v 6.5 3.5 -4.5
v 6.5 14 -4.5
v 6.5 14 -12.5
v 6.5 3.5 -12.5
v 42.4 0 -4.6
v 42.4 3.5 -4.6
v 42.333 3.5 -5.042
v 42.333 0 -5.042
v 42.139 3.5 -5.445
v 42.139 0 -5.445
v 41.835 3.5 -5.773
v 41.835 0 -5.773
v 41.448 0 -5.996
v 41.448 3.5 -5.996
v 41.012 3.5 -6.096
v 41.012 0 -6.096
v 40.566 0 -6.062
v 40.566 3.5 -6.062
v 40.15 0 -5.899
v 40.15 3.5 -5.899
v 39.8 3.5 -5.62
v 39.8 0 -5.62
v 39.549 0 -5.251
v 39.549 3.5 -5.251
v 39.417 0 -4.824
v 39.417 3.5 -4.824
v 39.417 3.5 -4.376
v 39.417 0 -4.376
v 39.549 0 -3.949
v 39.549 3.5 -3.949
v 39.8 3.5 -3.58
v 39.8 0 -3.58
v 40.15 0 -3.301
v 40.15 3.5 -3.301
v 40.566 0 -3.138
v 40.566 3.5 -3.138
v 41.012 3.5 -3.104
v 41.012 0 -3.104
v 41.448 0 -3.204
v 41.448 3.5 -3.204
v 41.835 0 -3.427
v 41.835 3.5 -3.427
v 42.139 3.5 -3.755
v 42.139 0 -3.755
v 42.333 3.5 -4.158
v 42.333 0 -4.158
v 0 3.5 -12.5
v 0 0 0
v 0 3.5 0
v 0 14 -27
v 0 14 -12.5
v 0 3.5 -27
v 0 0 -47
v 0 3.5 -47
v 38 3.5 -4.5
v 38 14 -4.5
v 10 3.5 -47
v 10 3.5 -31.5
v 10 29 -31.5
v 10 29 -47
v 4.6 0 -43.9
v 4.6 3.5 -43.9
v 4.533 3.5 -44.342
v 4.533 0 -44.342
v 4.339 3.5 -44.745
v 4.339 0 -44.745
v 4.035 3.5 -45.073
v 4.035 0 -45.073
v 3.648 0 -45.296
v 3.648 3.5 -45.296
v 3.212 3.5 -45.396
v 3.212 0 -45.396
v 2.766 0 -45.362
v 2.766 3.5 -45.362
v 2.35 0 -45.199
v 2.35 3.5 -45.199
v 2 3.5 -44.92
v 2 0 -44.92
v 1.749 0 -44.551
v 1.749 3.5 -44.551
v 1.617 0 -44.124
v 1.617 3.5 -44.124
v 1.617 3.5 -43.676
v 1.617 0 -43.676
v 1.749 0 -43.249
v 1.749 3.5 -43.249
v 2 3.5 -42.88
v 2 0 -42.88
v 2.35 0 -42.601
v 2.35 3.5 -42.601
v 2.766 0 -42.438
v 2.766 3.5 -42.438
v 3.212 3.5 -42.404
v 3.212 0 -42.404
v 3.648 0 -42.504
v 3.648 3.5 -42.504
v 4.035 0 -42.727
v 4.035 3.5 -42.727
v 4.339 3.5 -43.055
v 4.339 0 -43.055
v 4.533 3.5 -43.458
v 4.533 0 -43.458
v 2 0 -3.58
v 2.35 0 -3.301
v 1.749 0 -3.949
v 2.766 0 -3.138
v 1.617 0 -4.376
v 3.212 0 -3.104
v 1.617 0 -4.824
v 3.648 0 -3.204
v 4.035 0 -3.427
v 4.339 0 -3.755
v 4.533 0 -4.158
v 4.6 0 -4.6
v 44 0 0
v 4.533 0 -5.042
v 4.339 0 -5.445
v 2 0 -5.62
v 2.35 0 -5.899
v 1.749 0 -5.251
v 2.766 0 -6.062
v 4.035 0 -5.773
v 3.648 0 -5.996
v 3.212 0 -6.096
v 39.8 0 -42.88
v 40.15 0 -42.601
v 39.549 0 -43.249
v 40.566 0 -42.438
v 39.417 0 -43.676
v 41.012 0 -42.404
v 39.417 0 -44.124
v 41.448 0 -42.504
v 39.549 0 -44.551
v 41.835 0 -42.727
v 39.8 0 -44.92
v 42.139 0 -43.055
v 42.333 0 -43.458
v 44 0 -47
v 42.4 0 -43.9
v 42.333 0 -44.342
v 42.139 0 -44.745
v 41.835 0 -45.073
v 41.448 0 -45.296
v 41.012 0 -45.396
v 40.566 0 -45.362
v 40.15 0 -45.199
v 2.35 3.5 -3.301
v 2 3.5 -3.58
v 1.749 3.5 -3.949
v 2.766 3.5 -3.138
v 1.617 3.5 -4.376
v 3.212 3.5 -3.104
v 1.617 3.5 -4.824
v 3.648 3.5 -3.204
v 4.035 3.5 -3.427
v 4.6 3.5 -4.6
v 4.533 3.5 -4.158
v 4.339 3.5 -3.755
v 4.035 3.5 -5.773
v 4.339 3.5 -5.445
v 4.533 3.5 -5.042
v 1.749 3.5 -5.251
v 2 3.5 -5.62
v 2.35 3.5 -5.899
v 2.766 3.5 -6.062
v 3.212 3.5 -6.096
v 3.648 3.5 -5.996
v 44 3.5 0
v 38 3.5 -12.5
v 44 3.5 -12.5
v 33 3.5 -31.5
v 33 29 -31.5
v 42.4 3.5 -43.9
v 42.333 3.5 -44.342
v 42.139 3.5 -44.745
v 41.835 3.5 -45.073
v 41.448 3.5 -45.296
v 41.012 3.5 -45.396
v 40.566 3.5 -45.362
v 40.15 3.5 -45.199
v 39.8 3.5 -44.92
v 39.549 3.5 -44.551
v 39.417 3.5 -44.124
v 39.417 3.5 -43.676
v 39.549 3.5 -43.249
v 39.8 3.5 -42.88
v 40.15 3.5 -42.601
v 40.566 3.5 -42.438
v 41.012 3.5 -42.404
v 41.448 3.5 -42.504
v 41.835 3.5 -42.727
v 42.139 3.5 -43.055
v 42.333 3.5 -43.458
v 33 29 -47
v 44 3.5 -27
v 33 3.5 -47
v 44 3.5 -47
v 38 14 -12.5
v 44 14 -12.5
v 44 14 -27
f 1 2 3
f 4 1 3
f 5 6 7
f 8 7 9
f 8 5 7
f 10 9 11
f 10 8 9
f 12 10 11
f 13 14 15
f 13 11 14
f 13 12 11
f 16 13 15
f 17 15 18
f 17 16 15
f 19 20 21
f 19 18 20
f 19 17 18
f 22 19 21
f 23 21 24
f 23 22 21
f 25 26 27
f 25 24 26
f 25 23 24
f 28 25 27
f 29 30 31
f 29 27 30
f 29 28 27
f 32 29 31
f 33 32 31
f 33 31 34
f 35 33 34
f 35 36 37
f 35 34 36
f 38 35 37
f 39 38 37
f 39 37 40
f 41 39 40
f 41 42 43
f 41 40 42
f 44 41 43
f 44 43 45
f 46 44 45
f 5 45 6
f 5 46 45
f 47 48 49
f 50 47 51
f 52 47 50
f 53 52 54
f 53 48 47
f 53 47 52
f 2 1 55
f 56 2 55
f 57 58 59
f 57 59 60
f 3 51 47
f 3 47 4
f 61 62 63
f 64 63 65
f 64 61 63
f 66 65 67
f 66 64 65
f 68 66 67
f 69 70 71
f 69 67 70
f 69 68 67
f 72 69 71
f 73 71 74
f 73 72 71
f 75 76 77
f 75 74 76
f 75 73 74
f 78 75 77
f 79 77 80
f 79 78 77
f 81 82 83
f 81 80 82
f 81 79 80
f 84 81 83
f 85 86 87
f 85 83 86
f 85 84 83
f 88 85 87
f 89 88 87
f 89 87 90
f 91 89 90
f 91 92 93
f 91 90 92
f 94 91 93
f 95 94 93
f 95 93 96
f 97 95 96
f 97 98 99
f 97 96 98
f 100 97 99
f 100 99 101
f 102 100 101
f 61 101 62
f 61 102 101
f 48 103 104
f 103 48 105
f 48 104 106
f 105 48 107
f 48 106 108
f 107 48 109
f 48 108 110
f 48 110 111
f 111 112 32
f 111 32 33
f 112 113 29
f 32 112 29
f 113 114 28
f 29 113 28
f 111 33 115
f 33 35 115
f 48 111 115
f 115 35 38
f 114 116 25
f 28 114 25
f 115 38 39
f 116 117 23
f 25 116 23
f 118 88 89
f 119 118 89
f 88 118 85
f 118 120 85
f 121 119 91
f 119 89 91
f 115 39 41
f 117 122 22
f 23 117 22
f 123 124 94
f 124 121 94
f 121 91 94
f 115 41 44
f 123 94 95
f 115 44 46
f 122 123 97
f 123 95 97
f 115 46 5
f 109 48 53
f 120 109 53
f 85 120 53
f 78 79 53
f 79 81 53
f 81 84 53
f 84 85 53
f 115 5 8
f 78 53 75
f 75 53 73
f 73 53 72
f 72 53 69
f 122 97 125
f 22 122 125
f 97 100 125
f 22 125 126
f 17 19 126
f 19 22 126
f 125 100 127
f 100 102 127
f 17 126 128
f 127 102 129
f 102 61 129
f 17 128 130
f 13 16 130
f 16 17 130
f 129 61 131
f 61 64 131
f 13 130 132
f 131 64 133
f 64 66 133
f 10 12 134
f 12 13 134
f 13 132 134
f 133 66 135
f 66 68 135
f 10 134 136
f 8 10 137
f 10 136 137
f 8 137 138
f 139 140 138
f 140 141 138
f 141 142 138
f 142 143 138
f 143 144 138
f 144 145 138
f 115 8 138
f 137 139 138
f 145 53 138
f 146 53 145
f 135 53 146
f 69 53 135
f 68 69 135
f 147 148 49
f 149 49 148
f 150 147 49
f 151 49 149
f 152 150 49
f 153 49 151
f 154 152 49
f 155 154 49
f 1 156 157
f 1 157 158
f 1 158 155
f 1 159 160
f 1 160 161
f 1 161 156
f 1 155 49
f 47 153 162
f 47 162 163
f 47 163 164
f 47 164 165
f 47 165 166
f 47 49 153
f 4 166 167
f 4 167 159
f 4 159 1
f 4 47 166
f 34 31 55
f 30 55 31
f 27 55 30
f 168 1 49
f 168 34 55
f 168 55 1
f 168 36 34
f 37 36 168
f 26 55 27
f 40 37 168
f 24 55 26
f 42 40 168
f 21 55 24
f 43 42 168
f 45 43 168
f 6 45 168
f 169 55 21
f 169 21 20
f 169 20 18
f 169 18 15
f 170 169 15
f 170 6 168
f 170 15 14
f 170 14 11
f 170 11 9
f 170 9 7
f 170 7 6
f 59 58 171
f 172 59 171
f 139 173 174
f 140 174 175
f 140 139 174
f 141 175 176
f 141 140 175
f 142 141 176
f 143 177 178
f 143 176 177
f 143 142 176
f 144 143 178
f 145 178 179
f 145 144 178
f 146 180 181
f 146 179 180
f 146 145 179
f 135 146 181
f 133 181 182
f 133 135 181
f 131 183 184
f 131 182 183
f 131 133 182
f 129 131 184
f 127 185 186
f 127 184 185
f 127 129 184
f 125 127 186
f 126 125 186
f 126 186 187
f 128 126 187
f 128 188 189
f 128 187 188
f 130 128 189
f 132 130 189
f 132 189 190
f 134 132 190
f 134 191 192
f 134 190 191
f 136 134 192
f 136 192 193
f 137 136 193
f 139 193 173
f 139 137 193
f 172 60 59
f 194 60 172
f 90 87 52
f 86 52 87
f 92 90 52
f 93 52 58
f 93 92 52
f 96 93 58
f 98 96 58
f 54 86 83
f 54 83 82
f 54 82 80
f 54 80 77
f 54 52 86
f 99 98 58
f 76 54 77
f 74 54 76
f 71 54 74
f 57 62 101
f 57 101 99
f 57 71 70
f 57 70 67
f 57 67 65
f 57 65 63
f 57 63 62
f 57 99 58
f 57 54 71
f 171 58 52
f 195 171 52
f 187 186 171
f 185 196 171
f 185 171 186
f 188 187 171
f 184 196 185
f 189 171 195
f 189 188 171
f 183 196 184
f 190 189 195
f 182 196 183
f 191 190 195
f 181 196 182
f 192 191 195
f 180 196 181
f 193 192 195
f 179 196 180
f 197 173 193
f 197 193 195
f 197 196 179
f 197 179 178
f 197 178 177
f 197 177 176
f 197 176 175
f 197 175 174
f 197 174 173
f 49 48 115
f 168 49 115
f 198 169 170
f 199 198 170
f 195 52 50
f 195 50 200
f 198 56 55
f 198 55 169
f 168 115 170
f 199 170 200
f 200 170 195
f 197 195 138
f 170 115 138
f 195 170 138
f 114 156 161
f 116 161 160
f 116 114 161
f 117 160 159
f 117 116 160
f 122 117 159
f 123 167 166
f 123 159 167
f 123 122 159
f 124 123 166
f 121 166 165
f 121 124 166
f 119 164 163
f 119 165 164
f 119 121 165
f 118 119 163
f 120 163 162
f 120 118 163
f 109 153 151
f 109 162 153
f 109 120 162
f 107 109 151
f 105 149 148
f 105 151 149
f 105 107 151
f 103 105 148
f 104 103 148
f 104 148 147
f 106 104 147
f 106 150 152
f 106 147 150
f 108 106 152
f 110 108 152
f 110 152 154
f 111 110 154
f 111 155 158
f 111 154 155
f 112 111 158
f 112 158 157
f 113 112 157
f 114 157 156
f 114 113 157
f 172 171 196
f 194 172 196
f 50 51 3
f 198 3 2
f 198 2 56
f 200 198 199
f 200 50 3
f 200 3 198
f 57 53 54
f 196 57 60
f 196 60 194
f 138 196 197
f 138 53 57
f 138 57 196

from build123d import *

# Parameters (mm, degrees)
SKETCH2_W               = 44
SKETCH2_H               = 47
BOSS_EXTRUDE1_DEPTH     = 3.5
SKETCH3_W               = 44
SKETCH3_H               = 22.5
BOSS_EXTRUDE2_DEPTH     = 10.5
SKETCH4_W               = 23
SKETCH4_H               = 15.5
BOSS_EXTRUDE3_DEPTH     = 25.5
SKETCH5_W               = 6.5
SKETCH5_H               = 8
SKETCH5_W_2             = 6
CUT_EXTRUDE1_DEPTH      = 10.5
SKETCH6_R               = 1.5
CUT_EXTRUDE3_DEPTH      = 30
CUT_EXTRUDE3_DEPTH_BACK = 1


with BuildPart() as part:
    # Sketch2 → Boss-Extrude1 (new body)
    with BuildSketch(Plane(origin=(0, 0, 0), x_dir=(1, 0, 0), z_dir=(0, 1, 0))):
        with Locations((22, 23.5)):
            Rectangle(SKETCH2_W, SKETCH2_H)
    extrude(amount=BOSS_EXTRUDE1_DEPTH)

    # Sketch3 → Boss-Extrude2 (add)
    with BuildSketch(Plane(origin=(0, 3.5, 0), x_dir=(1, 0, 0), z_dir=(0, 1, 0))):
        with Locations((22, 15.75)):
            Rectangle(SKETCH3_W, SKETCH3_H)
    extrude(amount=BOSS_EXTRUDE2_DEPTH)

    # Sketch4 → Boss-Extrude3 (add)
    with BuildSketch(Plane(origin=(0, 3.5, 0), x_dir=(1, 0, 0), z_dir=(0, 1, 0))):
        with Locations((21.5, 39.25)):
            Rectangle(SKETCH4_W, SKETCH4_H)
    extrude(amount=BOSS_EXTRUDE3_DEPTH)

    # Sketch5 → Cut-Extrude1 (cut)
    with BuildSketch(Plane(origin=(0, 14, 0), x_dir=(1, 0, 0), z_dir=(0, 1, 0))):
        with Locations((3.25, 8.5)):
            Rectangle(SKETCH5_W, SKETCH5_H)
        with Locations((41, 8.5)):
            Rectangle(SKETCH5_W_2, SKETCH5_H)
    extrude(amount=-CUT_EXTRUDE1_DEPTH, mode=Mode.SUBTRACT)

    # Sketch6 → Cut-Extrude3 (cut, two sides)
    with BuildSketch(Plane(origin=(0, 0, 0), x_dir=(1, 0, 0), z_dir=(0, 1, 0))) as cut_extrude3_sk:
        with Locations((3.1, 43.9)):
            Circle(SKETCH6_R)
        with Locations((40.9, 43.9)):
            Circle(SKETCH6_R)
        with Locations((40.9, 4.6)):
            Circle(SKETCH6_R)
        with Locations((3.1, 4.6)):
            Circle(SKETCH6_R)
    extrude(amount=CUT_EXTRUDE3_DEPTH, mode=Mode.SUBTRACT)
    extrude(cut_extrude3_sk.sketch, amount=-CUT_EXTRUDE3_DEPTH_BACK, mode=Mode.SUBTRACT)


solid = part.part
